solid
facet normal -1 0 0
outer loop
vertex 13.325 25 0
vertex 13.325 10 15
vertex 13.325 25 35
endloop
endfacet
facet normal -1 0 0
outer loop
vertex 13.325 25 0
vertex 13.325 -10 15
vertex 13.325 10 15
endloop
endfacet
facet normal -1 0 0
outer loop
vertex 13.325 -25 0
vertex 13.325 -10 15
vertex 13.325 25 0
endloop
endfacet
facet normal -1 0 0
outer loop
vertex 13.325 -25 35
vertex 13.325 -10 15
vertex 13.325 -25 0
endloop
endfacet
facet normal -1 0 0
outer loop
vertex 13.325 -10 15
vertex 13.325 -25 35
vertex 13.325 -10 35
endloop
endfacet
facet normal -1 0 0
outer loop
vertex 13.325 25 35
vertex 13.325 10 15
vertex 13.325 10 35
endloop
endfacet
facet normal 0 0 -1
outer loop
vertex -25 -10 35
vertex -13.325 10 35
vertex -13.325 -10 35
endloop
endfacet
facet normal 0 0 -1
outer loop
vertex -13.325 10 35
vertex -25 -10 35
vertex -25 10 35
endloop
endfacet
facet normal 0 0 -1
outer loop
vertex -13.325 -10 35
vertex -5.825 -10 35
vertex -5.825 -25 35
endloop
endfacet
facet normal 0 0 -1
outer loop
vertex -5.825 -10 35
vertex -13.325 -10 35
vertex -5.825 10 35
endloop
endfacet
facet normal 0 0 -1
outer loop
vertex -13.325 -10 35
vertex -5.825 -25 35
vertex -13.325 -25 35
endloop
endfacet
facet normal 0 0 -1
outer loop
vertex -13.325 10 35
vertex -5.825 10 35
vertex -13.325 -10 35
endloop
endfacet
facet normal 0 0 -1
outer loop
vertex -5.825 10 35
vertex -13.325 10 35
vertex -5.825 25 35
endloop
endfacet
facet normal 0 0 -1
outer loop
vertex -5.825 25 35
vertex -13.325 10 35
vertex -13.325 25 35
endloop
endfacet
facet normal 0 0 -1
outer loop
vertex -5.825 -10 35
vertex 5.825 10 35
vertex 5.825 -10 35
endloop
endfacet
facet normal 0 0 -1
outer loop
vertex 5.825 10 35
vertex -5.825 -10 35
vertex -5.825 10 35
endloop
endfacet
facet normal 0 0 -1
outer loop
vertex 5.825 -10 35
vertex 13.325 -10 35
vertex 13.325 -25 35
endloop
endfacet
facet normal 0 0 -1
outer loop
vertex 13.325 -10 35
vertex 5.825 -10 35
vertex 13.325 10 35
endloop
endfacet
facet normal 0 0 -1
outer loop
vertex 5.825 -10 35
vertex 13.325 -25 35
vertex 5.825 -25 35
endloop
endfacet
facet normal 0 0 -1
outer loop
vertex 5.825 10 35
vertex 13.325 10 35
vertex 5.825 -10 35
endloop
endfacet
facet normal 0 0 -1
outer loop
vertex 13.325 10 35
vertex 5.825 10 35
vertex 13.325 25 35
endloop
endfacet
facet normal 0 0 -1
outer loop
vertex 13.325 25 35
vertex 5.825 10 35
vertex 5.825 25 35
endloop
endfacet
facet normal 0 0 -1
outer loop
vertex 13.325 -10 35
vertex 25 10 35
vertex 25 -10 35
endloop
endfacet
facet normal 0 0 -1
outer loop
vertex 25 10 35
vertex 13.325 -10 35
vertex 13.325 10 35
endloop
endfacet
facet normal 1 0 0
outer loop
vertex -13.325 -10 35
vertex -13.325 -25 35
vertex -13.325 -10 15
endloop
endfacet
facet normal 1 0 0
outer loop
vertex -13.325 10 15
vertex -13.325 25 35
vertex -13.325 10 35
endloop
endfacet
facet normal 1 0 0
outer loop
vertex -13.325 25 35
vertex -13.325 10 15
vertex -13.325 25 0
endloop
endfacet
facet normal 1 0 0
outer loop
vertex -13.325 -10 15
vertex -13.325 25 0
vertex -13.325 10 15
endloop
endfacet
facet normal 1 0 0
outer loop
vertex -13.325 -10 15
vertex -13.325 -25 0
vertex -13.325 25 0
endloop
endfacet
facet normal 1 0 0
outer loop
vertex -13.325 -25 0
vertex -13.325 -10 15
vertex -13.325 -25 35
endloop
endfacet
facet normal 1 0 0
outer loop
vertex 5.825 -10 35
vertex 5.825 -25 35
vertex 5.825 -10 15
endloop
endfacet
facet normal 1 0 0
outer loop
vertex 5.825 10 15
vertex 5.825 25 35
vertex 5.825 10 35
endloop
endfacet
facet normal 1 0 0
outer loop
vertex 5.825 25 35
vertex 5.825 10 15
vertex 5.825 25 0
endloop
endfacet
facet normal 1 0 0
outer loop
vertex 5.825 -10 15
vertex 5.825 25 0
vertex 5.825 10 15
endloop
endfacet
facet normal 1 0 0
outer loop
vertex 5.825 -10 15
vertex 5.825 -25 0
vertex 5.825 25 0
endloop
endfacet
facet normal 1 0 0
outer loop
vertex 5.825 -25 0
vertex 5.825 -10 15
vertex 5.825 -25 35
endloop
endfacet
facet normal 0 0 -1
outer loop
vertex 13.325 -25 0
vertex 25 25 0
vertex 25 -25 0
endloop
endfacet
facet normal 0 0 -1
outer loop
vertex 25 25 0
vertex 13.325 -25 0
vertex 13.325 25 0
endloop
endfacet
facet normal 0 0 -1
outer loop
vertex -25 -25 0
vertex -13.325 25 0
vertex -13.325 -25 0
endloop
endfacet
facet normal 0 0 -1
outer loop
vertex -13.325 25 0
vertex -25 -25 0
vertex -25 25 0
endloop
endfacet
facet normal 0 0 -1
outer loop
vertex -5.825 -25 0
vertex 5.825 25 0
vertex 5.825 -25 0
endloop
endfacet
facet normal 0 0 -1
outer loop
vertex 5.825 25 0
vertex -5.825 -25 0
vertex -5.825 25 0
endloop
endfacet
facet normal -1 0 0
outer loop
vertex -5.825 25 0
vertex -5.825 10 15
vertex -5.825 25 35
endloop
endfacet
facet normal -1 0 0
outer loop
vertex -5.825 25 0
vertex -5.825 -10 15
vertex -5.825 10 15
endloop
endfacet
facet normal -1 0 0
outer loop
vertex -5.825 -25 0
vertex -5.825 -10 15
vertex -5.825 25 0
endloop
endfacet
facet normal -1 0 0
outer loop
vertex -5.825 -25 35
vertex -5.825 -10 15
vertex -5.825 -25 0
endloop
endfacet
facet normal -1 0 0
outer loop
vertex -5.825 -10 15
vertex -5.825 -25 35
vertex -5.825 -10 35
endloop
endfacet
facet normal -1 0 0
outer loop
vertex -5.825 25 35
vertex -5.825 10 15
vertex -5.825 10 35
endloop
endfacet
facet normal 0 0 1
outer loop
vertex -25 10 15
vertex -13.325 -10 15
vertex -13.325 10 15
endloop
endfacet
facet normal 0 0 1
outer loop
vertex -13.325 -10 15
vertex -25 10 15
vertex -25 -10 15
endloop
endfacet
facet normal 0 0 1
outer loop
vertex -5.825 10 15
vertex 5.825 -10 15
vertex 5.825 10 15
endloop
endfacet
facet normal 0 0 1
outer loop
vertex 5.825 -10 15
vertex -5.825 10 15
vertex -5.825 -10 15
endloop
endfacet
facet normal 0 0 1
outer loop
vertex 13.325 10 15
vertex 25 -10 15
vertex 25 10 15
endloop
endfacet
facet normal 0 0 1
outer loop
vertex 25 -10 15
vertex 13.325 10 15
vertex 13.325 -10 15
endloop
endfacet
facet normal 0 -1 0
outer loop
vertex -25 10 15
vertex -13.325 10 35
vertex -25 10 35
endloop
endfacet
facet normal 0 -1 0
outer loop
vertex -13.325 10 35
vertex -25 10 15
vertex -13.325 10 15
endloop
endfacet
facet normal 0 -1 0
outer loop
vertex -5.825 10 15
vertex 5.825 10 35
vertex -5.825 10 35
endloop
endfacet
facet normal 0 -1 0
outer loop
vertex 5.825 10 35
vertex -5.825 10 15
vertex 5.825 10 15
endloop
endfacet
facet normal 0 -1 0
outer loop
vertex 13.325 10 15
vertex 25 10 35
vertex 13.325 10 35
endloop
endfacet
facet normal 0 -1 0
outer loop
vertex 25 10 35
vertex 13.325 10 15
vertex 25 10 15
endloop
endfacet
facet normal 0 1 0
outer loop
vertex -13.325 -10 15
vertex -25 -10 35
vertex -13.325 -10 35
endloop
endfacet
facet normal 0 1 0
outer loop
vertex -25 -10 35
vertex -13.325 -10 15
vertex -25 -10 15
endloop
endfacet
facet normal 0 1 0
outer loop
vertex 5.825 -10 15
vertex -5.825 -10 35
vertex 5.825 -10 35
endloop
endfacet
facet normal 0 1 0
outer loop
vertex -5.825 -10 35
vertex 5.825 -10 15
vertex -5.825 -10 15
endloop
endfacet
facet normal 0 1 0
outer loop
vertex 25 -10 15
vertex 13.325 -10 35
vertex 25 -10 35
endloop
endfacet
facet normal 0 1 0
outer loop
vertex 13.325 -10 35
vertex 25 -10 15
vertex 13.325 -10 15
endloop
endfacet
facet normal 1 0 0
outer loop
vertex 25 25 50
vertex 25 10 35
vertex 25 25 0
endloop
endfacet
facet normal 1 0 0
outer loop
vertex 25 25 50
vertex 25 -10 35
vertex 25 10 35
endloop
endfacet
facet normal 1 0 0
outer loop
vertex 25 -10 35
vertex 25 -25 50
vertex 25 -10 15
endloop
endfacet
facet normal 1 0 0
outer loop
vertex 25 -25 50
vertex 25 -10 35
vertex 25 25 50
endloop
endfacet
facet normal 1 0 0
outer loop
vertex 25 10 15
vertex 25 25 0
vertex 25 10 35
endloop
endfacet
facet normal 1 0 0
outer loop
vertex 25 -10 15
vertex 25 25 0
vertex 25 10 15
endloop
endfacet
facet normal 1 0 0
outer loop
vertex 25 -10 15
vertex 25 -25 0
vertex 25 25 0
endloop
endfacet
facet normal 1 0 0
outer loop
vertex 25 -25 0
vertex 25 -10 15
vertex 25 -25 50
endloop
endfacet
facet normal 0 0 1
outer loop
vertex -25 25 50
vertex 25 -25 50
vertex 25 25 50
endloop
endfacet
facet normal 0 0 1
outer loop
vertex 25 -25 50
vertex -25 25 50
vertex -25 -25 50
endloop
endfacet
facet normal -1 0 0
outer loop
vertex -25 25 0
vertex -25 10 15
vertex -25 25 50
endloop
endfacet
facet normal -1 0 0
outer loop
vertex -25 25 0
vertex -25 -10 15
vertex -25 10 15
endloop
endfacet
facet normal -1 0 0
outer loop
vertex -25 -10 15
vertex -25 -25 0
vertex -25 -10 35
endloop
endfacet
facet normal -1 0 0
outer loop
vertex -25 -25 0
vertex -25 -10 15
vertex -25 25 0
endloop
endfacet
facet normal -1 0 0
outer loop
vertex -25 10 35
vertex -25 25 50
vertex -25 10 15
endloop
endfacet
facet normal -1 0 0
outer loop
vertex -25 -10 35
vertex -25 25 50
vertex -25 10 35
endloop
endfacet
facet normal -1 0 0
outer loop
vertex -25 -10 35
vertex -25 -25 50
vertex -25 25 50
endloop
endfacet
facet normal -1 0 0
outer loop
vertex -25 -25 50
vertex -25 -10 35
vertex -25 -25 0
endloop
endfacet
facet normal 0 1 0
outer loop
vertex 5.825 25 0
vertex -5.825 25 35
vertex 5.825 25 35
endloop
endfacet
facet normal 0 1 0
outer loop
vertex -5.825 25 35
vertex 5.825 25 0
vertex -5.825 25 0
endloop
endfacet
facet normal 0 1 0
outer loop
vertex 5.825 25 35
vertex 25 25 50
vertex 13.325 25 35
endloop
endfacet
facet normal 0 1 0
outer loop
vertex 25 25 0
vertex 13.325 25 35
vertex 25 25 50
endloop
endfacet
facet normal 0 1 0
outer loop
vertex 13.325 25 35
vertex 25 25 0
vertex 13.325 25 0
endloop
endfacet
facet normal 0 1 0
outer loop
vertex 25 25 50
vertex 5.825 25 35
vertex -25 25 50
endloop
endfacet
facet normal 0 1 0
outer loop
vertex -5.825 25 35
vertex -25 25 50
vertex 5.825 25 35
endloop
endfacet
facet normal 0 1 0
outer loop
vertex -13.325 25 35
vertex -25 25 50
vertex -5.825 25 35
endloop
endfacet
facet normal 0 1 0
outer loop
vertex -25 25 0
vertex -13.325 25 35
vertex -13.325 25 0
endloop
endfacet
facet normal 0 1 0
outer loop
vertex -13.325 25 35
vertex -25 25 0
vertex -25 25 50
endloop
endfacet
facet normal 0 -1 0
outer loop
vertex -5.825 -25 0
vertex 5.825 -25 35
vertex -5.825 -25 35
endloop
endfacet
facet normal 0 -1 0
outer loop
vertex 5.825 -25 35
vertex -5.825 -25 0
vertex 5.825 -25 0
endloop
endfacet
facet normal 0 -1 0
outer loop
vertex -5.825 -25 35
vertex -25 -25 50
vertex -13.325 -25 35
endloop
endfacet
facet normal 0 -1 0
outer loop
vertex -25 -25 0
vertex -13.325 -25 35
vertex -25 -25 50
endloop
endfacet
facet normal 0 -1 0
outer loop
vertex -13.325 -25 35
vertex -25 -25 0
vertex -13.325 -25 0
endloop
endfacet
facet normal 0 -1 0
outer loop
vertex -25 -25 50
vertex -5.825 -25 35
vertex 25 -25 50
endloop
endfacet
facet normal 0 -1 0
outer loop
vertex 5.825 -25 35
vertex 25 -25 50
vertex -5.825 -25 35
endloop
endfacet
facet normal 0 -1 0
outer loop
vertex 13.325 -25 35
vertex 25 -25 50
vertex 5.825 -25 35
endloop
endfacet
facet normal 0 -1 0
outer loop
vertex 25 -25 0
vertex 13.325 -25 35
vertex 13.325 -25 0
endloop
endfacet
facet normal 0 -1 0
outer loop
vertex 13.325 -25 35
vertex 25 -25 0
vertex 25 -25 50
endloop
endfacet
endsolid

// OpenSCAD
M_Slit_Width = 150; //[0:300]
M_Slit_Height = 70; //[0:100]
O_Width = 40; //[0:100]
O_Height = 40; //[0:100]
//width in centimeters
size = 5;
Clip_O_To_Match_M_Slits = 0; //[1:yes,0:no]
Upside_Down = 0; //[1:yes,0:no]

if(Upside_Down==0)
{
	scale(size*10) object();
}
else
{
	scale(size*10) translate([0,0,1]) scale([1,1,-1]) object();
}


module object()
{
difference()
{
	translate([0,0,0.5]) cube(size=1, center=true);
	union()
	{
		difference()
		{
			translate([0,0,(mSepH/2)-0.1]) cube(size=[0.333+(4*mSepW/3),2,mSepH+0.2], center=true);
			translate([0,0,0.5]) cube(size=[0.333-(2*mSepW/3),2,1], center=true);
		}
		difference()
		{
			translate([0,0,0.5]) cube(size=[2,ow,oh], center=true);
			if(co==1)
			{
				translate([-0.5,-0.5,mSepH]) cube(size=[1,1,1-mSepH]);
			}
		}
	}
}
}

mSepW = M_Slit_Width/1000;
mSepH = M_Slit_Height/100;
ow = O_Width/100;
oh = O_Height/100;
co = Clip_O_To_Match_M_Slits;
